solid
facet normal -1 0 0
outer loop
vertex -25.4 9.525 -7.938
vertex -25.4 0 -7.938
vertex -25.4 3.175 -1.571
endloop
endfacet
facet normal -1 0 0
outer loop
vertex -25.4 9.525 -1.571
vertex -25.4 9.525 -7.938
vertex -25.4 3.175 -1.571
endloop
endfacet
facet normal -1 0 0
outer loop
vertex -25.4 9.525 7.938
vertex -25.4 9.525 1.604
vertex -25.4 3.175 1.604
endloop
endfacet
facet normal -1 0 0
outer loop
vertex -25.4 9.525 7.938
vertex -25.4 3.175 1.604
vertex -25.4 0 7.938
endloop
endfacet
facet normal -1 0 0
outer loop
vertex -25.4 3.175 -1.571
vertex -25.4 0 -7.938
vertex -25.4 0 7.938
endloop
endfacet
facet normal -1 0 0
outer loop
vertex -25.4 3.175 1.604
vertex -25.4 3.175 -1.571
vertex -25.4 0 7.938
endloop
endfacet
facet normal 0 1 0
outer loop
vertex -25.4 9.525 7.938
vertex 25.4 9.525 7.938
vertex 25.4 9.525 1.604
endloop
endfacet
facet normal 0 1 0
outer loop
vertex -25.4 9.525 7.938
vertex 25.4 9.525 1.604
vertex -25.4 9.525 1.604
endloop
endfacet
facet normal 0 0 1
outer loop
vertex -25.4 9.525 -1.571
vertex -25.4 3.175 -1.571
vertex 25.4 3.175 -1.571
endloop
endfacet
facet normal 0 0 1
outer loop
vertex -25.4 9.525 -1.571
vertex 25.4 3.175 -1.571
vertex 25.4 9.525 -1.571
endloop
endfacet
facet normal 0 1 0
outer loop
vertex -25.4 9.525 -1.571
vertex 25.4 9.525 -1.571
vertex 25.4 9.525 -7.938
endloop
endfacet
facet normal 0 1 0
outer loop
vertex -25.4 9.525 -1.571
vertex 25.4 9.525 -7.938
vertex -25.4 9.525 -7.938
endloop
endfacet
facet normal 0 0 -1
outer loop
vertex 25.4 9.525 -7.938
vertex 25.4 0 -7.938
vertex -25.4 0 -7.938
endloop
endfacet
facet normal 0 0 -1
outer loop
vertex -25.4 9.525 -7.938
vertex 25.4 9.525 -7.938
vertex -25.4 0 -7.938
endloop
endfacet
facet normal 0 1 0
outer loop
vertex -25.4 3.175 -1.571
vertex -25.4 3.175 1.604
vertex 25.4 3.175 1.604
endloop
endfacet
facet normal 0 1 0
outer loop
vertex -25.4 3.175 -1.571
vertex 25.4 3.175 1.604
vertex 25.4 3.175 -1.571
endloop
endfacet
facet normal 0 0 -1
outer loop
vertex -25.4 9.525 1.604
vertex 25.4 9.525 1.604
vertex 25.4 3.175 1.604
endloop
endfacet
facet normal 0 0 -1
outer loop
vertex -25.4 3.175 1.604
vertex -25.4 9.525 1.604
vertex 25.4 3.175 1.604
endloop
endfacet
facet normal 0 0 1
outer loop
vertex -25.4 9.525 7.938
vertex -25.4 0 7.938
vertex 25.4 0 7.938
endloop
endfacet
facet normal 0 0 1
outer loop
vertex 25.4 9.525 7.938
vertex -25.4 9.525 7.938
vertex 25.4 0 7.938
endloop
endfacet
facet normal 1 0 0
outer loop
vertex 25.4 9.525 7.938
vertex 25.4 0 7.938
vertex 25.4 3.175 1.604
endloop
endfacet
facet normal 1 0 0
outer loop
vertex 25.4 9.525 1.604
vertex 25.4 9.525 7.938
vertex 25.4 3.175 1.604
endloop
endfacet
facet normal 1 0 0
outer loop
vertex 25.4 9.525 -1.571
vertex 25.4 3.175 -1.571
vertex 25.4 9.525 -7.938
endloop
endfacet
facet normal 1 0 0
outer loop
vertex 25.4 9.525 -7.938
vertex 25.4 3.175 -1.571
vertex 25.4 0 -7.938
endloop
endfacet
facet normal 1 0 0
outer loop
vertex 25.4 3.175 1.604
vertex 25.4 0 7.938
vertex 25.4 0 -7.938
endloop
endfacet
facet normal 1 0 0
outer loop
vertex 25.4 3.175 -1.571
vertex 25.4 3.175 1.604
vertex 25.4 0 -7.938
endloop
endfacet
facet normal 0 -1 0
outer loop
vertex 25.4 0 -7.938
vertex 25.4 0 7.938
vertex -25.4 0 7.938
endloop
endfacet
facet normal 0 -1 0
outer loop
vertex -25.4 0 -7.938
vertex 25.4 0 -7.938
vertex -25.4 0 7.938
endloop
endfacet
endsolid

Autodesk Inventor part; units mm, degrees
ref_plane "YZ Plane" through (0, 0, 0) normal (1, 0, 0) x (0, 1, 0)
ref_plane "XZ Plane" through (0, 0, 0) normal (0, 1, 0) x (-1, 0, 0)
ref_plane "XY Plane" through (0, 0, 0) normal (0, 0, 1) x (1, 0, 0)
sketch "Sketch1" plane through (0, 0, 0) normal (0, 1, 0) x (-1, 0, 0)
  line L0 (-25.4, -7.9375) -> (25.4, -7.9375)
  line L1 (25.4, -7.9375) -> (25.4, 7.9375)
  line L2 (25.4, 7.9375) -> (-25.4, 7.9375)
  line L3 (-25.4, 7.9375) -> (-25.4, -7.9375)
  line L4 (-25.4, -7.9375) -> (25.4, 7.9375) construction
  line L5 (25.4, -7.9375) -> (-25.4, 7.9375) construction
  point P0 (0, 0)
  dimension "d0" = 50.8
  dimension "d1" = 15.875
extrude "Extrusion1" add sketch "Sketch1" along normal blind 9.525
sketch "Sketch2" plane through (-25.4, 0, -7.9375) normal (-1, 0, 0) x (0, 0, 1)
  line L0 (0, 9.525) -> (15.875, 9.525) projected
  line L1 (9.5418, 3.175) -> (6.3668, 3.175)
  line L2 (6.3668, 3.175) -> (6.3668, 9.525)
  line L3 (6.3668, 9.525) -> (9.5418, 9.525)
  line L4 (9.5418, 9.525) -> (9.5418, 3.175)
  line L5 (9.5418, 3.175) -> (6.3668, 9.525) construction
  line L6 (6.3668, 3.175) -> (9.5418, 9.525) construction
  point P0 (7.9375, 0)
  point P1 (7.9543, 6.35)
  dimension "d4" = 3.175
  dimension "d5" = 6.35
extrude "Extrusion2" cut sketch "Sketch2" against normal up to next
properties part number "Test1"
